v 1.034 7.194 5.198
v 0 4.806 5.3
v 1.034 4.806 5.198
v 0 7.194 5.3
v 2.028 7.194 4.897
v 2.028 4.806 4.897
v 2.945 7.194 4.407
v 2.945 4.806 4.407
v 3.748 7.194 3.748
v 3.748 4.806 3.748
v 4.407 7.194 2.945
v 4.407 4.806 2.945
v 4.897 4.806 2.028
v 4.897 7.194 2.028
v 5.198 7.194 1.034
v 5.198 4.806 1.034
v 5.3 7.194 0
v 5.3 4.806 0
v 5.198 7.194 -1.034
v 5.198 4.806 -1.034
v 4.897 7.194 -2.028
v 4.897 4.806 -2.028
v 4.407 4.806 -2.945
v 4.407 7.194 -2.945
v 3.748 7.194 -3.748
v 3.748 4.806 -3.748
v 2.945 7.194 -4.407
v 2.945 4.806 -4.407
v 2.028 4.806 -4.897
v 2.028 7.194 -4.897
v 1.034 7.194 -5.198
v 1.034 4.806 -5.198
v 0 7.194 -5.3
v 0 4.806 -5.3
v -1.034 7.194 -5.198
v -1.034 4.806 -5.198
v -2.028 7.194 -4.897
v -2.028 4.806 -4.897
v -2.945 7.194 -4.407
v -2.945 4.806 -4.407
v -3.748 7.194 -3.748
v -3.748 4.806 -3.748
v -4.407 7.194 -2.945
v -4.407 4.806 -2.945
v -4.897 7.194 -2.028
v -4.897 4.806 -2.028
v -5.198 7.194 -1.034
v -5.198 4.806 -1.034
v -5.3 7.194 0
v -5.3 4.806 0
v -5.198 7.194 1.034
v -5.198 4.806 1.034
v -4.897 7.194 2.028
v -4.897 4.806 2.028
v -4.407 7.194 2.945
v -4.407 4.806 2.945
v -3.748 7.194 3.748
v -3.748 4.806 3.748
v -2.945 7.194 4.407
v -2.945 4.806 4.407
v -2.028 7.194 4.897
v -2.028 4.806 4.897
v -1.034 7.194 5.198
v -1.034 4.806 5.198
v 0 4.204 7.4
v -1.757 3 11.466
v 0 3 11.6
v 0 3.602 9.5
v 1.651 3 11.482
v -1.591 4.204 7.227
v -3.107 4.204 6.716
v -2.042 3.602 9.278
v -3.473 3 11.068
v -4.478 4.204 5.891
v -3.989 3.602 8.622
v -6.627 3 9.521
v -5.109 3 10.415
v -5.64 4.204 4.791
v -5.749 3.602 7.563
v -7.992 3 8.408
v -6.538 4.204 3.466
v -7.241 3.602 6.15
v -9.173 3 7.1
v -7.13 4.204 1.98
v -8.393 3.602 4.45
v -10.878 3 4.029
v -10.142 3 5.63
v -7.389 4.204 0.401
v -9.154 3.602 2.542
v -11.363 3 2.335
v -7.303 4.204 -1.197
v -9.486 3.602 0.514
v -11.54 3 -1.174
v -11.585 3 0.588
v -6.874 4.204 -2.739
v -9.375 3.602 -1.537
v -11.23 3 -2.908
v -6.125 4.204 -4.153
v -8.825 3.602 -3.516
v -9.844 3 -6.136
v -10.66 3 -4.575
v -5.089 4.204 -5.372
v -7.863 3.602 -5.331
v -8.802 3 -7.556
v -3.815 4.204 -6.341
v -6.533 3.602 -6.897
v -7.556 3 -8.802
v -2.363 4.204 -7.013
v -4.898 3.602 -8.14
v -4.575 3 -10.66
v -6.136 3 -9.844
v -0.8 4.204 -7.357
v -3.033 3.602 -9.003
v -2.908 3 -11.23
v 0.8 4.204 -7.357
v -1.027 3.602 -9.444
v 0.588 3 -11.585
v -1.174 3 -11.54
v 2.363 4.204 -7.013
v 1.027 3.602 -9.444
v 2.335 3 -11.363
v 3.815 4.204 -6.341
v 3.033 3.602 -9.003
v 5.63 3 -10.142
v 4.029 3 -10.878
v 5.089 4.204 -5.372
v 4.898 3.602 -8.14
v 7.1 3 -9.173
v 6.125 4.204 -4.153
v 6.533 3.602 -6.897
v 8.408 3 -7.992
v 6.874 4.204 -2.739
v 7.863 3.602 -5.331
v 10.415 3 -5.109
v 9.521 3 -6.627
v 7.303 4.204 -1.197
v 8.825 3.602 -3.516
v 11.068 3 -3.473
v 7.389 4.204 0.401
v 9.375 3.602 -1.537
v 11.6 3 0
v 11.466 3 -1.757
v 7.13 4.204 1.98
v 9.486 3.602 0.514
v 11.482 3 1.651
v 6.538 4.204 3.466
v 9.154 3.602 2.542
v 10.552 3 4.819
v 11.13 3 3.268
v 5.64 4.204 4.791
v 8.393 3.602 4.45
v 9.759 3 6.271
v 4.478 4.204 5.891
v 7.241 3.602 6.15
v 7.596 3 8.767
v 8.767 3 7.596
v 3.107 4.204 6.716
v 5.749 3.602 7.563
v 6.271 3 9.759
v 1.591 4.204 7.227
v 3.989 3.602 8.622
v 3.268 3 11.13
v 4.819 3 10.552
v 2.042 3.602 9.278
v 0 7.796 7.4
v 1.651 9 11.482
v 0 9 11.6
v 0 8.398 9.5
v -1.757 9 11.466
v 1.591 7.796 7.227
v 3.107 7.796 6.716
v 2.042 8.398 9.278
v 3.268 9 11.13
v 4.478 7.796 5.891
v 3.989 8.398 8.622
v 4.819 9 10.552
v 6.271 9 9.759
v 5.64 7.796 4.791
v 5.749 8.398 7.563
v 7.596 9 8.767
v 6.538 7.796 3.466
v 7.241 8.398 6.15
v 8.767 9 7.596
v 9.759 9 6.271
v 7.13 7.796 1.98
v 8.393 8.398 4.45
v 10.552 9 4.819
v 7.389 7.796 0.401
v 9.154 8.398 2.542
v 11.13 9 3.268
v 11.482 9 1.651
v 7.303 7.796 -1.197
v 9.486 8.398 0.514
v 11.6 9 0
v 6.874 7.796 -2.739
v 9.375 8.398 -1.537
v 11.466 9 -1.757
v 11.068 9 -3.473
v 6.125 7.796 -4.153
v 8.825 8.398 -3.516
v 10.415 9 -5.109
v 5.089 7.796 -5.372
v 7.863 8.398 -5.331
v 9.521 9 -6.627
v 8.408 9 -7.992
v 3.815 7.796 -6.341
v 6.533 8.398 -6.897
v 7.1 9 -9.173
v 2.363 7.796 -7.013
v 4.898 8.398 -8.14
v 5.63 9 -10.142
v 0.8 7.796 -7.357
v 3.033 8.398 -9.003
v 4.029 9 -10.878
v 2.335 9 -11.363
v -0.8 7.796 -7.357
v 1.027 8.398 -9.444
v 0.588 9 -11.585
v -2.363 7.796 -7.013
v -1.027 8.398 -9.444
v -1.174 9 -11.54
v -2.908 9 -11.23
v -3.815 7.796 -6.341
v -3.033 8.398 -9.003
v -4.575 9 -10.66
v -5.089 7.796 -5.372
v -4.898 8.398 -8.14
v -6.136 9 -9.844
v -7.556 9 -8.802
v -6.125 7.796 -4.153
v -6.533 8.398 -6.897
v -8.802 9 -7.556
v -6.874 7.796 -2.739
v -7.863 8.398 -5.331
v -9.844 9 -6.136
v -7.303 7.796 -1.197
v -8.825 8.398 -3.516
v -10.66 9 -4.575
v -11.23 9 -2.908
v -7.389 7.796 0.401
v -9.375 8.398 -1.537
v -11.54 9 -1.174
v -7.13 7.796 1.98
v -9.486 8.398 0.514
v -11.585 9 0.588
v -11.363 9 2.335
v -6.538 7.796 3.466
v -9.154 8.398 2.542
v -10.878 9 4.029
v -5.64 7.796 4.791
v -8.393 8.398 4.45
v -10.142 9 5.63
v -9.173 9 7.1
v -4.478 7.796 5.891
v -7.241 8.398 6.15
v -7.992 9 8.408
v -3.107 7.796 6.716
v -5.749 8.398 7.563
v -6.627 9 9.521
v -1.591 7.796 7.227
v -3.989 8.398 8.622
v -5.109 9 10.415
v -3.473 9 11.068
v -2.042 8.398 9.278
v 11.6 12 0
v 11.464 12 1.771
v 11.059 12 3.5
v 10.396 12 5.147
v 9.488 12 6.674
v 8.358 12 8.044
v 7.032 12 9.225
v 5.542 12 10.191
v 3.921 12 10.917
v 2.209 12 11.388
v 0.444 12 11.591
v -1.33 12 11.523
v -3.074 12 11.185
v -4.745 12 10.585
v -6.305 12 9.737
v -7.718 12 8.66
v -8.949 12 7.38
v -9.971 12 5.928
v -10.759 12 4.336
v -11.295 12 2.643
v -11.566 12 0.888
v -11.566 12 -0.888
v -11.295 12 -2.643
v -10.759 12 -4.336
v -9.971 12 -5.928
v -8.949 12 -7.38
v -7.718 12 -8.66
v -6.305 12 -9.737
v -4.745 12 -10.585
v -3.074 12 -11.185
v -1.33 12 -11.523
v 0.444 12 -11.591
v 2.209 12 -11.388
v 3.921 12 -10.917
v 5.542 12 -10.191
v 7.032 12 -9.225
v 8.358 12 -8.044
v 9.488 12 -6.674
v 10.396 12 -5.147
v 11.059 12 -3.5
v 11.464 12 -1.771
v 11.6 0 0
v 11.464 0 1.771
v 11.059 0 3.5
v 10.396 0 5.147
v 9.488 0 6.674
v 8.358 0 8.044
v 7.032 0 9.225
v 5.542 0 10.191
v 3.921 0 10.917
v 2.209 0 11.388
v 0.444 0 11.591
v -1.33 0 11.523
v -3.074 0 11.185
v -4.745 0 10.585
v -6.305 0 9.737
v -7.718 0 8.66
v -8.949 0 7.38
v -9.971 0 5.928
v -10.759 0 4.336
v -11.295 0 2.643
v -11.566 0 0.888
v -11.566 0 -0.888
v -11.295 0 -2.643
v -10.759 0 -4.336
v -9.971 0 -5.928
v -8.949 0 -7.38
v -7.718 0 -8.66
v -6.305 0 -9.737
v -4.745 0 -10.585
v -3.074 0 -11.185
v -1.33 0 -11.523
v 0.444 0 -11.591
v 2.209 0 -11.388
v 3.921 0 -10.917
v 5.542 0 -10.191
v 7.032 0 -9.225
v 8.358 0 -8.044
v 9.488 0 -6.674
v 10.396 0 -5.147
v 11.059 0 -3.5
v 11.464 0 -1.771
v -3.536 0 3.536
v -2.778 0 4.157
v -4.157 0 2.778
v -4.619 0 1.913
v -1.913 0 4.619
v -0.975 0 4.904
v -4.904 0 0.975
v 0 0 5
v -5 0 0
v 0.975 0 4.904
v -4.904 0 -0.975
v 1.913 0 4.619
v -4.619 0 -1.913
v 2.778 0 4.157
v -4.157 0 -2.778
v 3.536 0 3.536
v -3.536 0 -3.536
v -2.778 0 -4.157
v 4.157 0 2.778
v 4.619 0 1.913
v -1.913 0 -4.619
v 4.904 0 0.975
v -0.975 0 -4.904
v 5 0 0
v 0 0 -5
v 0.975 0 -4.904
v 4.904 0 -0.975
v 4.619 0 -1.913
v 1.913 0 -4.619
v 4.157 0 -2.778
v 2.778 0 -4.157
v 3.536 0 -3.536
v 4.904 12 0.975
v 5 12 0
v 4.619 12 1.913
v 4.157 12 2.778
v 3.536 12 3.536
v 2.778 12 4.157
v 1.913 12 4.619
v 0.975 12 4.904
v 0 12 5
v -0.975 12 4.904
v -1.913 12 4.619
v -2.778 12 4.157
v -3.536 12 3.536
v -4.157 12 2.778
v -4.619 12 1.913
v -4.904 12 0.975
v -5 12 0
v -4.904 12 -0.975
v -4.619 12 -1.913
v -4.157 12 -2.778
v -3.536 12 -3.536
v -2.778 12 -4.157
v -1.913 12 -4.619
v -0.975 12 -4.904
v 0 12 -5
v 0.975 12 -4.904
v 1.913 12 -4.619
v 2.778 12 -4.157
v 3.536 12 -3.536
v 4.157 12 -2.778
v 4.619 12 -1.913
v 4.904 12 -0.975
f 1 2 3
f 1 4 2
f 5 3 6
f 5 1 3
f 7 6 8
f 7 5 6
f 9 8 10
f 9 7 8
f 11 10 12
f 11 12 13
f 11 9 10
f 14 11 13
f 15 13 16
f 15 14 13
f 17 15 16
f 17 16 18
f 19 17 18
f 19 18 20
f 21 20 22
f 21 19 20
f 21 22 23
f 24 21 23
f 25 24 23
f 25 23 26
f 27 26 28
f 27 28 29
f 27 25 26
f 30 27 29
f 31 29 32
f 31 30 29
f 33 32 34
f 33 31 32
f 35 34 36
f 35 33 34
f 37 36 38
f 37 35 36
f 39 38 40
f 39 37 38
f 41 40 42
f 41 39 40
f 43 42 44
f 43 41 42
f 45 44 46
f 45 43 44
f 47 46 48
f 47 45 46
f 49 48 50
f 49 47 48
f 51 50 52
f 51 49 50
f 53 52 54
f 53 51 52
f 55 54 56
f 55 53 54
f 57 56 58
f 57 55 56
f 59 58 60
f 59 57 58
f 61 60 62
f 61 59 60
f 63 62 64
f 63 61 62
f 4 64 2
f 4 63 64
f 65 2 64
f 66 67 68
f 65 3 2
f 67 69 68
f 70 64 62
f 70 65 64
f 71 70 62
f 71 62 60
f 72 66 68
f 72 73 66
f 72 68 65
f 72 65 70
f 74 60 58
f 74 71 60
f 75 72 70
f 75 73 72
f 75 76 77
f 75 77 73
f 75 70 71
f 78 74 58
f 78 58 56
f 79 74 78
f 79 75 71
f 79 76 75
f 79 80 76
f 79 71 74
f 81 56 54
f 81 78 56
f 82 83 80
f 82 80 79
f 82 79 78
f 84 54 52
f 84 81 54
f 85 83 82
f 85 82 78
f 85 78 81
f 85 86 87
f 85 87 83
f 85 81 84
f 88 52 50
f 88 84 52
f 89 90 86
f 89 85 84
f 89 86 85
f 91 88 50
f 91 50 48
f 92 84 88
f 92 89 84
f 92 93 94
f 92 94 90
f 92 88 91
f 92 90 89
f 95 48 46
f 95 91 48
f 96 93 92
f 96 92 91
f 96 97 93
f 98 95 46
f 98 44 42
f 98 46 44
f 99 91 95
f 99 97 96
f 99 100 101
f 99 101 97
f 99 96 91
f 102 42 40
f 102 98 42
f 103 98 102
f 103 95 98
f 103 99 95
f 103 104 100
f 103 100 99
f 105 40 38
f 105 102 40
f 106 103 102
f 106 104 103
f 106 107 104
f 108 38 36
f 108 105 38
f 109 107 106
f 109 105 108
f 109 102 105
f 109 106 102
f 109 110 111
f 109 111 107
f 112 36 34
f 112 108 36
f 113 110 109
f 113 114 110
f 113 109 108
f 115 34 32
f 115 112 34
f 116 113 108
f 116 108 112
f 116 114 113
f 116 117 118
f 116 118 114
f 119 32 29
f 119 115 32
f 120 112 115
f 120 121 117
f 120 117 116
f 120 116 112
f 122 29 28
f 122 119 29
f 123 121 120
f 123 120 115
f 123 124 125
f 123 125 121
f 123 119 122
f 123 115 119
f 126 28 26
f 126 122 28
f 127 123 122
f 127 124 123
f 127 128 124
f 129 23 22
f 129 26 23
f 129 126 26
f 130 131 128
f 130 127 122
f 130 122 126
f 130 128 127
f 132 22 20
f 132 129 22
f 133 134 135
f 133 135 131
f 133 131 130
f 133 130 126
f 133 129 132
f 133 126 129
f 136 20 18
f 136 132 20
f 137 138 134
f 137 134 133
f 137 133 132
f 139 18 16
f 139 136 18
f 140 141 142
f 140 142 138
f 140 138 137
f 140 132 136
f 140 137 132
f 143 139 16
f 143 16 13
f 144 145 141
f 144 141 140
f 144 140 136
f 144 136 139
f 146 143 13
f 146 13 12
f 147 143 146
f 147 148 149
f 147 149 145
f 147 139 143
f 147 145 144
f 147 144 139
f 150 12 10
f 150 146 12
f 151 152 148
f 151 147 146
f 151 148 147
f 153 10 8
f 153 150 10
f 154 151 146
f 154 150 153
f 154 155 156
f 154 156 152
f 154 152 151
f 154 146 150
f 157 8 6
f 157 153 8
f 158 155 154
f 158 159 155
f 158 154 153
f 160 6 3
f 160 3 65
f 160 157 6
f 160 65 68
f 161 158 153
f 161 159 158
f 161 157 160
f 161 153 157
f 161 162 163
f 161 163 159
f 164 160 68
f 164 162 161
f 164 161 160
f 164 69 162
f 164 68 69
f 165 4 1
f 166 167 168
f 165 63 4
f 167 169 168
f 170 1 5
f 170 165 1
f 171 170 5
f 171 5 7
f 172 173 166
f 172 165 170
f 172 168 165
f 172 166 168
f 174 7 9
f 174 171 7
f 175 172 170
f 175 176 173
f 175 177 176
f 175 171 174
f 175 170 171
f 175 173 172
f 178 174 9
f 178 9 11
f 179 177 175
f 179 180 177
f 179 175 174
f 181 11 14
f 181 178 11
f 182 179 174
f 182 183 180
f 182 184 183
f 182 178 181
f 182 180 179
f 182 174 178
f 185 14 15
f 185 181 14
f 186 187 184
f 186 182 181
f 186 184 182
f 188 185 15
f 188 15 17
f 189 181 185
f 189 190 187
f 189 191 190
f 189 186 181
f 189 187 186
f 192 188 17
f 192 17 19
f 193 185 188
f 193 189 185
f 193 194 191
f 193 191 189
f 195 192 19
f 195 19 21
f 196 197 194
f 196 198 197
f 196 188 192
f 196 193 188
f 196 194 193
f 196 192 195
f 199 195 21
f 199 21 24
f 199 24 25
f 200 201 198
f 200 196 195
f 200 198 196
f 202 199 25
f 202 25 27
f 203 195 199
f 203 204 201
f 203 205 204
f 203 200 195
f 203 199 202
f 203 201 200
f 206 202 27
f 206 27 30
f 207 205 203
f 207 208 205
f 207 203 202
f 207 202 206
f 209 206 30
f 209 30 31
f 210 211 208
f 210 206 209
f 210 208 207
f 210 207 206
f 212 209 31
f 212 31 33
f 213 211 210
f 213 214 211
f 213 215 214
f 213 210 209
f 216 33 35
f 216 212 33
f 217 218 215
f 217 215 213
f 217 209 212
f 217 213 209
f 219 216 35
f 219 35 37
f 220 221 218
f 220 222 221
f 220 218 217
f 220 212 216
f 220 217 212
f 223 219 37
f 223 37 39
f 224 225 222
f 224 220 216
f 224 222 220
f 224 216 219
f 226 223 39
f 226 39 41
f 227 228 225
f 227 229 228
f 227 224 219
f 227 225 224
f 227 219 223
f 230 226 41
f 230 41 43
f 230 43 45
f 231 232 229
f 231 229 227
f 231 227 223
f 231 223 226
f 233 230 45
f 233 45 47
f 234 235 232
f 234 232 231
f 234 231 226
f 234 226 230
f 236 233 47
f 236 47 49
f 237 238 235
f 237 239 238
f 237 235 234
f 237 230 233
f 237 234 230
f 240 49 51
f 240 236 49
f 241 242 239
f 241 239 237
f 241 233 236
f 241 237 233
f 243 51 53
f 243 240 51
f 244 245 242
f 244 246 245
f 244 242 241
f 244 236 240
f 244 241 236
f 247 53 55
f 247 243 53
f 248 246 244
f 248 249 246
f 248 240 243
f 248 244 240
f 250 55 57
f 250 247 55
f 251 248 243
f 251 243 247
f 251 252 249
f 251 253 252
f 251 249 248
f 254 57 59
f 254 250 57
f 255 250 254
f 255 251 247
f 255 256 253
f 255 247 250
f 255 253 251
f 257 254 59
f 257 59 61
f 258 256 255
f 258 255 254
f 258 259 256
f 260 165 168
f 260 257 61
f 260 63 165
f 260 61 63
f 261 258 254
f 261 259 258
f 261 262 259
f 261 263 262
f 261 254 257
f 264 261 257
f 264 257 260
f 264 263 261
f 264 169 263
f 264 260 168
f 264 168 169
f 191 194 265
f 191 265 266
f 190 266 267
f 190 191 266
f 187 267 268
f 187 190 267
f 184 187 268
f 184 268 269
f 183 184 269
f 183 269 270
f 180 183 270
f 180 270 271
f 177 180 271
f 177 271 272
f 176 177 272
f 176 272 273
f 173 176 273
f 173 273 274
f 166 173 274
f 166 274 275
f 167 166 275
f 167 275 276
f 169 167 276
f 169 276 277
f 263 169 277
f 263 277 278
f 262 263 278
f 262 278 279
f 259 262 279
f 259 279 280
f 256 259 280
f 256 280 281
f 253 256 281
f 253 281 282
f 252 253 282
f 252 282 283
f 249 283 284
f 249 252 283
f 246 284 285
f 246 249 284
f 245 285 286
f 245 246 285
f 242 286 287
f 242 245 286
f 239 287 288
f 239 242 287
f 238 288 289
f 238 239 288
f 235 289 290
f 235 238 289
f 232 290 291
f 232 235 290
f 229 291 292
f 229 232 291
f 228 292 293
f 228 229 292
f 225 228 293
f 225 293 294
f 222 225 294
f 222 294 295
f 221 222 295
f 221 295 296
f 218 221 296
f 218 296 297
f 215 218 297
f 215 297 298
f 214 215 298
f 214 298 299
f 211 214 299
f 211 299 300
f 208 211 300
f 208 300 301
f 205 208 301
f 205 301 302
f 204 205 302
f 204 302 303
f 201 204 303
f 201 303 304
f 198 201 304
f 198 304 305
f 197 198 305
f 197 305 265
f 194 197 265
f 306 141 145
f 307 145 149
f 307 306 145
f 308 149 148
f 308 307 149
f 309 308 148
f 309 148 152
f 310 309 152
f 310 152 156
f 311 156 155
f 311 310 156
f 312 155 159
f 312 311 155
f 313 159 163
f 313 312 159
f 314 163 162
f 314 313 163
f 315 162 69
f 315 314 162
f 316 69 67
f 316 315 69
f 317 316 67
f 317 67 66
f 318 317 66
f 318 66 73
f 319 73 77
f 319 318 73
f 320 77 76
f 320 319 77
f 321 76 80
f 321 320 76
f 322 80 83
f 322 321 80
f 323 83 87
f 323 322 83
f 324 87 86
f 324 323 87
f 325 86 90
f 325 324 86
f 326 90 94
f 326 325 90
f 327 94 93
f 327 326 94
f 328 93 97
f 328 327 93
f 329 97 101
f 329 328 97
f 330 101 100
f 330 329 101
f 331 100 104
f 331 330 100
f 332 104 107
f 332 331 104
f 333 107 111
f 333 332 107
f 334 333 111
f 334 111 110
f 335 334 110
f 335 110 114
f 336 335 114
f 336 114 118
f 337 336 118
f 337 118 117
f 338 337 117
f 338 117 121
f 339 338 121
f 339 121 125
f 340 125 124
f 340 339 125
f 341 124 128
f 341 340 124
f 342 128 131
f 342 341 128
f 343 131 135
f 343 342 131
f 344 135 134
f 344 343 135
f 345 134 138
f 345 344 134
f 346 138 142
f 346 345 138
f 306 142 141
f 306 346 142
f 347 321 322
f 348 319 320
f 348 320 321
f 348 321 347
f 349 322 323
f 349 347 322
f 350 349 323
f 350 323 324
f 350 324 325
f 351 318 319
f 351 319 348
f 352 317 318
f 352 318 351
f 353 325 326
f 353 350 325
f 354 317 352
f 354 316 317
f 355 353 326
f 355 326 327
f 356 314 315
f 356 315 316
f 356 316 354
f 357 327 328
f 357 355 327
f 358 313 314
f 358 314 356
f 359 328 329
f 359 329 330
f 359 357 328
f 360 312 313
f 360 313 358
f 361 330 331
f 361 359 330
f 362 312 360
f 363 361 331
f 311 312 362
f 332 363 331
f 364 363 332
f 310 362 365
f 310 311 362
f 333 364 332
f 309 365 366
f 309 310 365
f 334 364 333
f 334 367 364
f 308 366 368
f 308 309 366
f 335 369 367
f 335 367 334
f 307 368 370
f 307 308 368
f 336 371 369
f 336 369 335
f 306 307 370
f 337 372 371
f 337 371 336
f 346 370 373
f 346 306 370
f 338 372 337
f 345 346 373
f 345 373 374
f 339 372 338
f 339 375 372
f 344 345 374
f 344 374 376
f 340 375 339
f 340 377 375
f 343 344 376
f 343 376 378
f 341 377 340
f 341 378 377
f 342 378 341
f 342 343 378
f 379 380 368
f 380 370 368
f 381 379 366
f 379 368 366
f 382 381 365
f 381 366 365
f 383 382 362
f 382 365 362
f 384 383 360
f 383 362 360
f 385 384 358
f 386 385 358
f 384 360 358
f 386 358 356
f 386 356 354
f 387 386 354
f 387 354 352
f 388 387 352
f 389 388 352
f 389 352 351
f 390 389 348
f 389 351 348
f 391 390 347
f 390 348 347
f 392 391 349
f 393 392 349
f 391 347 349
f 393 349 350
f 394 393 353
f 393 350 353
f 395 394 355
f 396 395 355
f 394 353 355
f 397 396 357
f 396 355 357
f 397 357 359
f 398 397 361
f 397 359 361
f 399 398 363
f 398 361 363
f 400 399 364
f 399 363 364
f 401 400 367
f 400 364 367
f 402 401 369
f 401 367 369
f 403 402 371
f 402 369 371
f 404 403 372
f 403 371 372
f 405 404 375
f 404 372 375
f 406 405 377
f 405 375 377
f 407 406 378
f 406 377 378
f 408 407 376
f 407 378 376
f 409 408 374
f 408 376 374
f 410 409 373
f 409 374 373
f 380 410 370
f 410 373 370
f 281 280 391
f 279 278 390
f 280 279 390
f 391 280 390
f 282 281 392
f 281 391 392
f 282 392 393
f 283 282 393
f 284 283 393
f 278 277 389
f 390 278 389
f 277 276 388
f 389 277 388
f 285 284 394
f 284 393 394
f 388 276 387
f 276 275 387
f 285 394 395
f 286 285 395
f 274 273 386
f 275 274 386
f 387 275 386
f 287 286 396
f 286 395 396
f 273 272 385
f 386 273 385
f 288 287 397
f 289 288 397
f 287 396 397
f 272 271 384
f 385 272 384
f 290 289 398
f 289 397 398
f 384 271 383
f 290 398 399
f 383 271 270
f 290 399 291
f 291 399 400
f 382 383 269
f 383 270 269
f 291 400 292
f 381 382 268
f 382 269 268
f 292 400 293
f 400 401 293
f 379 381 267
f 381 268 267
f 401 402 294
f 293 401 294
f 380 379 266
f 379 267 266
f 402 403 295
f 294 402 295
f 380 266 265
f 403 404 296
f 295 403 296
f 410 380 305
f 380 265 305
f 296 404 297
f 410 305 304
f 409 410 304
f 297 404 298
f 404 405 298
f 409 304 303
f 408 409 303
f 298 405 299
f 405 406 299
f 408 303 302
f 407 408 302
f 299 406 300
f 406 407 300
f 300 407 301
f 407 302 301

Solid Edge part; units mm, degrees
sketch "Sketch1" plane through (0, 0, 0) normal (0, -1, 0) x (1, 0, 0)
  circle A0 centre (0, 0) radius 11.6
  dimension "D1" = 23.2
extrude "Protrusion1" add sketch "Sketch1" against normal blind 12
sketch "Sketch2" plane through (0, 0, 0) normal (0, -1, 0) x (1, 0, 0)
  circle A0 centre (0, 0) radius 5
  dimension "D1" = 10
extrude "Cutout1" cut sketch "Sketch2" against normal up to next
sketch "Sketch3" plane through (0, 0, 0) normal (1, 0, 0) x (0, 1, 0)
  line L0 (3, 11.6) -> (4.8065, 5.3)
  line L1 (4.8065, 5.3) -> (7.1935, 5.3)
  line L2 (7.1935, 5.3) -> (9, 11.6)
  line L3 (9, 11.6) -> (3, 11.6)
revolve "RevolvedCutout1" cut sketch "Sketch3" angle 360 about axis through (0, 0, 0) along (0, 1, 0)
properties material "Steel"
